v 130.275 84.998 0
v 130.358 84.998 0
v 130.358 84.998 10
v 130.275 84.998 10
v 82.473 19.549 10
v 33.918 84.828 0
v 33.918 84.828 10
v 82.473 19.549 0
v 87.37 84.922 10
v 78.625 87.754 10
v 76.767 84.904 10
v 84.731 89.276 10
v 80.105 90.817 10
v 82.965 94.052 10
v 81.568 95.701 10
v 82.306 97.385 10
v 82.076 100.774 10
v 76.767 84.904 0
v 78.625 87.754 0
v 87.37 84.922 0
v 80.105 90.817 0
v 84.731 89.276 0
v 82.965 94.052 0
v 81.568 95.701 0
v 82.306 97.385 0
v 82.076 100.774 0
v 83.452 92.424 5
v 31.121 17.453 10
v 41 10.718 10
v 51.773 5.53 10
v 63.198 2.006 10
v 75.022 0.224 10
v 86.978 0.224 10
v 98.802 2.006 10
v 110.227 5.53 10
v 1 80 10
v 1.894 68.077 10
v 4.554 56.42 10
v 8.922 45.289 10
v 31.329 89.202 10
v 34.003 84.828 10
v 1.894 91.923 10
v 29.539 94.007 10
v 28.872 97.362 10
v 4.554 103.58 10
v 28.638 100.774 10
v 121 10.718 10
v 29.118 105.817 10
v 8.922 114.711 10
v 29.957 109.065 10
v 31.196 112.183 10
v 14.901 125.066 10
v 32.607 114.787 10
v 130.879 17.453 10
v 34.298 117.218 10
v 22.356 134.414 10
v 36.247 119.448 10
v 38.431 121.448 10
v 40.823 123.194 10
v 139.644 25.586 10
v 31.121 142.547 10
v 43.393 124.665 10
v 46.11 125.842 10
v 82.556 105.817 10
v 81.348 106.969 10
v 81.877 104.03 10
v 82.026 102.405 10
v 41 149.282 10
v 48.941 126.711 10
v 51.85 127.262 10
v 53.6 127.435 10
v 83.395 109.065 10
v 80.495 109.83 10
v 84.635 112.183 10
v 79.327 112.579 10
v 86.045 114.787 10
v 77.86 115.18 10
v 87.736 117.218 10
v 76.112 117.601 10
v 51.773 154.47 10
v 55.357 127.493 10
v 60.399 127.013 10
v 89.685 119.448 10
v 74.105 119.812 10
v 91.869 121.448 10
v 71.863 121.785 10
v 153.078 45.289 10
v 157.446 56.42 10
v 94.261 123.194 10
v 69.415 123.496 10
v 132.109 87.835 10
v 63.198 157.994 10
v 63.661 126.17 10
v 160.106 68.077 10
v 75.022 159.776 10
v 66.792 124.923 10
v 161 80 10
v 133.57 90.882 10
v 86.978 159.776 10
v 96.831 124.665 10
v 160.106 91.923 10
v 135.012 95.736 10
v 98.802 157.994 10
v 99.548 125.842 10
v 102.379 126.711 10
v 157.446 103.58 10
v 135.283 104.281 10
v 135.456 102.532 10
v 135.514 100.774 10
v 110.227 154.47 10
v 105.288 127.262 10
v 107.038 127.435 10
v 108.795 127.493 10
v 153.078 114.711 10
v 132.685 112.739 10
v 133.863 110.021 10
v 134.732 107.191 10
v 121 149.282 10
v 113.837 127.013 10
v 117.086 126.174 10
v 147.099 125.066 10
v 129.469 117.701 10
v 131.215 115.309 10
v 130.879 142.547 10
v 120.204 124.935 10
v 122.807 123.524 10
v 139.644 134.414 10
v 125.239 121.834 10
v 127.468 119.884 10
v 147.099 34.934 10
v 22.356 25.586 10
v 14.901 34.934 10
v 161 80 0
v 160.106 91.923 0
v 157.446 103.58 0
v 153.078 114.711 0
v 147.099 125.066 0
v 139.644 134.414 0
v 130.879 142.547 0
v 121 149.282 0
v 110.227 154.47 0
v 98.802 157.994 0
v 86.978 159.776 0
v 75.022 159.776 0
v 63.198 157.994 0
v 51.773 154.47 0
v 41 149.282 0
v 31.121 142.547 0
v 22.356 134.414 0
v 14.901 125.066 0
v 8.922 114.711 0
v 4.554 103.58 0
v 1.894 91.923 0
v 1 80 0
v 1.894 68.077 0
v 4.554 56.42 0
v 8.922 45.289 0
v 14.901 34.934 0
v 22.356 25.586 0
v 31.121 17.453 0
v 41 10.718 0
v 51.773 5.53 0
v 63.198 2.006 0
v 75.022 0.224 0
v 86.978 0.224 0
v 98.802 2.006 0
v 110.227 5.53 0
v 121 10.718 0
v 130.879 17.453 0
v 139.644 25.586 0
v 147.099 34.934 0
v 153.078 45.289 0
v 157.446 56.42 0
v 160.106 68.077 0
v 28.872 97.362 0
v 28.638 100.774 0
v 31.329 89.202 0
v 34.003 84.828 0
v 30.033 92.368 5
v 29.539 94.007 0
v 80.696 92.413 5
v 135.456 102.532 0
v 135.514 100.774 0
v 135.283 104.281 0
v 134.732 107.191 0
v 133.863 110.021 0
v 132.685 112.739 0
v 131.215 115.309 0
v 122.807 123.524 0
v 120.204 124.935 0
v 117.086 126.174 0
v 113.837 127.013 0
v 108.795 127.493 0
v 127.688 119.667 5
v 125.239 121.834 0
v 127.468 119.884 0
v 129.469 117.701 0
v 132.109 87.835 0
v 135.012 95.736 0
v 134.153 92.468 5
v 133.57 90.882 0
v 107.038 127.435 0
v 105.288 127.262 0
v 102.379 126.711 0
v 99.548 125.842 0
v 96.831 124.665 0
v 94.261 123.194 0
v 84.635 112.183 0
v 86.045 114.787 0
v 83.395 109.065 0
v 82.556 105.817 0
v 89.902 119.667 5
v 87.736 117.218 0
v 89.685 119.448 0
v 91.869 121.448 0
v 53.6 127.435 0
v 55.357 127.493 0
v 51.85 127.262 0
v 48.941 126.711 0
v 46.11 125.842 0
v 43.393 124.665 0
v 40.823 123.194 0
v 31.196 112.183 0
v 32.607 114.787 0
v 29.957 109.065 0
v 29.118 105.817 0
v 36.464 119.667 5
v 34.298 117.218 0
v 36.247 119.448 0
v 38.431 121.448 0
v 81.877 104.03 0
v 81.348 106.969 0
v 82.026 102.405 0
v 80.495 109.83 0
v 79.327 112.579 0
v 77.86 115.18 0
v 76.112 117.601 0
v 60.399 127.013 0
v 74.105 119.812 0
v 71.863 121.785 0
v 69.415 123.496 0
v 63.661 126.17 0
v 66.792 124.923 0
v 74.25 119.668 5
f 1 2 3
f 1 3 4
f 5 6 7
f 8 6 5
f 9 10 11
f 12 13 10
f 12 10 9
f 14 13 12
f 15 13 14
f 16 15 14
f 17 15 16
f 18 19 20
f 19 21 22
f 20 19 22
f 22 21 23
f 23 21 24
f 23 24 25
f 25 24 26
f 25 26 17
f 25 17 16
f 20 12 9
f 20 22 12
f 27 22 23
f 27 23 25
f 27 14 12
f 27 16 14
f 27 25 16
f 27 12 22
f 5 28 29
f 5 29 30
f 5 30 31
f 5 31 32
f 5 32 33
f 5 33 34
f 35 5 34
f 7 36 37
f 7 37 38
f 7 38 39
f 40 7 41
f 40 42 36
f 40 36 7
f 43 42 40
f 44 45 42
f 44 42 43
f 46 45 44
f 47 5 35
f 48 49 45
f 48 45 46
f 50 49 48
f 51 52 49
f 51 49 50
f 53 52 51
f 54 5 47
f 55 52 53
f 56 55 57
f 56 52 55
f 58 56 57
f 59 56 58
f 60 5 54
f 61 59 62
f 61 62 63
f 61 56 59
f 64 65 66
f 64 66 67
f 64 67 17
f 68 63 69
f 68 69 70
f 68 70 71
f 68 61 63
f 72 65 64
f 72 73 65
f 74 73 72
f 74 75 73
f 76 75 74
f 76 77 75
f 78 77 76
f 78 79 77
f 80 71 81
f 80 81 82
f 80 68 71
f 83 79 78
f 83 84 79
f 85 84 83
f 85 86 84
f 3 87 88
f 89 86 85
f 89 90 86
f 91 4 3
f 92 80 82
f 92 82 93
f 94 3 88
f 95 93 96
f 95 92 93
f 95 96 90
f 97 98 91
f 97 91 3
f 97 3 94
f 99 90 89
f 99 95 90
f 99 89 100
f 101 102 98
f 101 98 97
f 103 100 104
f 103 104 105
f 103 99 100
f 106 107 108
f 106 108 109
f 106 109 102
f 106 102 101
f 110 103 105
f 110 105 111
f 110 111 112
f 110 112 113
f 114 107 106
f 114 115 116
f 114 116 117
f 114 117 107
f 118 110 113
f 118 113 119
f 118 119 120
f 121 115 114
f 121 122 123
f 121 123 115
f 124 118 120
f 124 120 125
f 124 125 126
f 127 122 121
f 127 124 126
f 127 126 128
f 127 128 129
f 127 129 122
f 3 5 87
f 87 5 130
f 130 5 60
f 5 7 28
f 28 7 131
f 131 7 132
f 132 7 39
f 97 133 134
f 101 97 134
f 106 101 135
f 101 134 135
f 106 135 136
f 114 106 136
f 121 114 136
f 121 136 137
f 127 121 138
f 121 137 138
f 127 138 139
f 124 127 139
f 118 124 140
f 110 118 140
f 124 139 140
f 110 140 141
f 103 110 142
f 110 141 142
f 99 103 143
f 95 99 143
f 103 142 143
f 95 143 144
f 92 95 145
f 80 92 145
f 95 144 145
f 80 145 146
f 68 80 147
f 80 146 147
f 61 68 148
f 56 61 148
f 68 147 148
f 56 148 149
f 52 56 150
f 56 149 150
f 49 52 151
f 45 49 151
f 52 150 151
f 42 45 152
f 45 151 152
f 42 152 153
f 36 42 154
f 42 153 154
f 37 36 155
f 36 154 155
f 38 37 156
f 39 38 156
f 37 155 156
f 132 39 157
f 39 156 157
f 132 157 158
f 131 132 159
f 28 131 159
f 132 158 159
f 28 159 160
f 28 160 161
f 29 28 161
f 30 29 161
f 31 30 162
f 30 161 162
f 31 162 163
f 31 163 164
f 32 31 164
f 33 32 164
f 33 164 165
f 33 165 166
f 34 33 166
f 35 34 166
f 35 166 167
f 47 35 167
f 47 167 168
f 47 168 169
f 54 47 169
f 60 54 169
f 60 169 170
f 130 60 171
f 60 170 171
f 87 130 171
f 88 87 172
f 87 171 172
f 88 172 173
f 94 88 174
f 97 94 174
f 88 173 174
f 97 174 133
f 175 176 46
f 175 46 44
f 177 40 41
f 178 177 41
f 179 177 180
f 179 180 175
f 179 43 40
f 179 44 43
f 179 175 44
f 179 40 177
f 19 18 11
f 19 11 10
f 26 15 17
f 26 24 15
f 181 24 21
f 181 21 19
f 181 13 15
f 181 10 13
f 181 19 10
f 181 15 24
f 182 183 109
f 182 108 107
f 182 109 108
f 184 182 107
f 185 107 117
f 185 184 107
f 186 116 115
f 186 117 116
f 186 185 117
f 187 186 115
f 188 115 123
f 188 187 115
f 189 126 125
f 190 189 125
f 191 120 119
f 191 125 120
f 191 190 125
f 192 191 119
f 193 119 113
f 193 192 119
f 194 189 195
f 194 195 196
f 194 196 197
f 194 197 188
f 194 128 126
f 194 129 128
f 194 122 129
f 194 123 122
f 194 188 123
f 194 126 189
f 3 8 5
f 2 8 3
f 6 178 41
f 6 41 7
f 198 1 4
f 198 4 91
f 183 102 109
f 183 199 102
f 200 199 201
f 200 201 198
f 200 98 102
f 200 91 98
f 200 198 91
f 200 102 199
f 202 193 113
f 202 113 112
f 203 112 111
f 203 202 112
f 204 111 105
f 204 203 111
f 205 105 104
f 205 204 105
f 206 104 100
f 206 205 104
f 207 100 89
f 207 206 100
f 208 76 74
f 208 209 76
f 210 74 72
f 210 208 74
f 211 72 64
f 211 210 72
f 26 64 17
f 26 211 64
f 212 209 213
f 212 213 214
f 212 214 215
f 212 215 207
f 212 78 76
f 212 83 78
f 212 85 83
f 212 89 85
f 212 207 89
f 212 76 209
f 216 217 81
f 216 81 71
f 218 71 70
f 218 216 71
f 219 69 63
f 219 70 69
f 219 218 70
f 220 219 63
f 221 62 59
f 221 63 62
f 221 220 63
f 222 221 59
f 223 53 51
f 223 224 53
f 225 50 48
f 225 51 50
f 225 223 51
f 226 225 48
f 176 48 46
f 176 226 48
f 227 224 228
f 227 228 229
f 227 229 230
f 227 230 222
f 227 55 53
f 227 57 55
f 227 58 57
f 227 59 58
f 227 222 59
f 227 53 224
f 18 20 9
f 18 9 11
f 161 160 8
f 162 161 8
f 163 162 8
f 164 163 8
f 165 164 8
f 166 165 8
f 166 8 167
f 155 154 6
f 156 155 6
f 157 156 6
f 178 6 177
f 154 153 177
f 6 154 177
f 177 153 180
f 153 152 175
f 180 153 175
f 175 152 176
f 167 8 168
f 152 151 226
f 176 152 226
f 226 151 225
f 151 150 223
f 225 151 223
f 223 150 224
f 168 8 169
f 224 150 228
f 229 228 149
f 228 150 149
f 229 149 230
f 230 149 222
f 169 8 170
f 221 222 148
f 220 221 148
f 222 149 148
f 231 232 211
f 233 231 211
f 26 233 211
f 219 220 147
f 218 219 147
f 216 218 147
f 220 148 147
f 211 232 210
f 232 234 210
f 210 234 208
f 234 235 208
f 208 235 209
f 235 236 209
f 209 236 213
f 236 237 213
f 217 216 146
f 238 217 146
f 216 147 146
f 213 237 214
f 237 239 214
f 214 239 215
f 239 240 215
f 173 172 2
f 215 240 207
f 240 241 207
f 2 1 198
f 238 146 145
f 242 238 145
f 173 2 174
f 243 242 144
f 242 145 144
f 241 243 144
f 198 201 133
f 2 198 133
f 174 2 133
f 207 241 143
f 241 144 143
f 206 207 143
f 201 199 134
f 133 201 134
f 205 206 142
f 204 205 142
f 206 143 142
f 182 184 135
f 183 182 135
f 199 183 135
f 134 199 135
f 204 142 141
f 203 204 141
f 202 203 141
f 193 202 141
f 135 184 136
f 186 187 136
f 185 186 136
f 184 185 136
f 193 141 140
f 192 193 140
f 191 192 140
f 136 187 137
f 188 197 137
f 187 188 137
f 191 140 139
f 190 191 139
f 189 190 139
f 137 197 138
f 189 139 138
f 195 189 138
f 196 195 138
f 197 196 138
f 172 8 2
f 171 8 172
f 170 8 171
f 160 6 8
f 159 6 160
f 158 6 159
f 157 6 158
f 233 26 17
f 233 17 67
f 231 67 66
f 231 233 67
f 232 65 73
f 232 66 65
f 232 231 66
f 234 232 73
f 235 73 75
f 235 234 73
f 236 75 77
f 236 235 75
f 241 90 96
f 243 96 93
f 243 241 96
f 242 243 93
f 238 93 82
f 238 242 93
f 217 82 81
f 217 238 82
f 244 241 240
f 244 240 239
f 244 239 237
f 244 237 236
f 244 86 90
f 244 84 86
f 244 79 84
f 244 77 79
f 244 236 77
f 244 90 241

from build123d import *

# Parameters (mm, degrees)
EXTRUDE_DEPTH  = 50
CYLINDER_R     = 80
CYLINDER_DEPTH = 10


with BuildPart() as extrude_body:
    # path1 → Extrude (new body)
    with BuildSketch(Plane(origin=(141.075886, -108.47872, 0), x_dir=(0, 1, 0), z_dir=(0, 0, 1))):
        with BuildLine():
            add(Edge.make_bspline(
                [(53.97197, 26.719046), (53.971828, 53.437687), (27.253187, 53.437824)],
                knots=[0, 0, 0, 1.570786, 1.570786, 1.570786], degree=2, weights=[1, 0.70711, 1]))
            add(Edge.make_bspline(
                [(27.253187, 53.437824), (18.390196, 53.400118), (11.306873, 48.072777)],
                knots=[0, 0, 0, 0.640587, 0.640587, 0.640587], degree=2, weights=[1, 0.949143, 1]))
            add(Edge.make_bspline(
                [(11.306873, 48.072777), (11.306873, 48.157527)],
                knots=[0, 0, 0.08475, 0.08475], degree=1))
            add(Edge.make_bspline(
                [(11.306873, 48.157527), (-53.97235, -0.397134)],
                knots=[0, 0, 81.356819, 81.356819], degree=1))
            add(Edge.make_bspline(
                [(-53.97235, -0.397134), (11.476372, -48.282584)],
                knots=[0, 0, 81.09594, 81.09594], degree=1))
            add(Edge.make_bspline(
                [(11.476372, -48.282584), (11.476372, -48.199384)],
                knots=[0, 0, 0.0832, 0.0832], degree=1))
            add(Edge.make_bspline(
                [(11.476372, -48.199384), (18.507438, -53.400694), (27.253187, -53.437824)],
                knots=[0, 0, 0, 0.632671, 0.632671, 0.632671], degree=2, weights=[1, 0.950382, 1]))
            add(Edge.make_bspline(
                [(27.253187, -53.437824), (53.97183, -53.437687), (53.97197, -26.719044)],
                knots=[0, 0, 0, 1.570786, 1.570786, 1.570786], degree=2, weights=[1, 0.70711, 1]))
            add(Edge.make_bspline(
                [(53.97197, -26.719044), (53.97184, -0.000391), (27.253187, -0.000254)],
                knots=[0, 0, 0, 1.570786, 1.570786, 1.570786], degree=2, weights=[1, 0.70711, 1]))
            add(Edge.make_bspline(
                [(27.253187, -0.000254), (18.455427, -0.037512), (11.400925, -5.294504)],
                knots=[0, 0, 0, 0.636185, 0.636185, 0.636185], degree=2, weights=[1, 0.949834, 1]))
            add(Edge.make_bspline(
                [(11.400925, -5.294504), (11.382321, 5.308466)],
                knots=[0, 0, 10.602986, 10.602986], degree=1))
            add(Edge.make_bspline(
                [(11.382321, 5.308466), (18.442454, 0.037323), (27.253187, -0.000254)],
                knots=[0, 0, 0, 0.637061, 0.637061, 0.637061], degree=2, weights=[1, 0.949697, 1]))
            add(Edge.make_bspline(
                [(27.253187, -0.000254), (53.97235, -0.000117), (53.97197, 26.719046)],
                knots=[0, 0, 0, 1.570805, 1.570805, 1.570805], degree=2, weights=[1, 0.707104, 1]))
        make_face()
    extrude(amount=EXTRUDE_DEPTH)


with BuildPart() as extrude_body_1:
    # Extrude placement: moved
    add(extrude_body.part.moved(Location((-59, 182, -21))))


with BuildPart() as cut:
    # Cylinder → Cylinder (new body)
    with BuildSketch(Plane(origin=(81, 80, 0), x_dir=(1, 0, 0), z_dir=(0, 0, 1))):
        Circle(CYLINDER_R)
    extrude(amount=CYLINDER_DEPTH)

    # Cut: cut Extrude body
    add(extrude_body_1.part, mode=Mode.SUBTRACT)


solid = cut.part
